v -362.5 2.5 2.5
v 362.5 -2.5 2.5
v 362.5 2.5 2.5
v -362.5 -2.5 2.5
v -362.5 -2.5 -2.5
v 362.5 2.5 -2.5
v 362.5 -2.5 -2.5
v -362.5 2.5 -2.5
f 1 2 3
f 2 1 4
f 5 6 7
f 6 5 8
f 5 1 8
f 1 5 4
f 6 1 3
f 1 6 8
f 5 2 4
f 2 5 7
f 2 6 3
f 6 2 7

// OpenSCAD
/*
rotate([0,0,360*$t])
translate([20,0,0])
cube(size =  10, center =  true);

rotate([0,360*$t,0])
translate([20,0,0])
cube(size =  10, center =  true);

rotate([360*$t,0,0])
translate([20,0,0])
cube(size =  10, center =  true);
*/


for(i=[-360:5:360]){
    translate([i,0,30*sin(i)*sin(360*$t)])
    cube(size = 5, center =  true);
    }


/*
translate([10*sin(360*$t),10*cos(360*$t),0])
cube(size = 10, center =  true);
*/
